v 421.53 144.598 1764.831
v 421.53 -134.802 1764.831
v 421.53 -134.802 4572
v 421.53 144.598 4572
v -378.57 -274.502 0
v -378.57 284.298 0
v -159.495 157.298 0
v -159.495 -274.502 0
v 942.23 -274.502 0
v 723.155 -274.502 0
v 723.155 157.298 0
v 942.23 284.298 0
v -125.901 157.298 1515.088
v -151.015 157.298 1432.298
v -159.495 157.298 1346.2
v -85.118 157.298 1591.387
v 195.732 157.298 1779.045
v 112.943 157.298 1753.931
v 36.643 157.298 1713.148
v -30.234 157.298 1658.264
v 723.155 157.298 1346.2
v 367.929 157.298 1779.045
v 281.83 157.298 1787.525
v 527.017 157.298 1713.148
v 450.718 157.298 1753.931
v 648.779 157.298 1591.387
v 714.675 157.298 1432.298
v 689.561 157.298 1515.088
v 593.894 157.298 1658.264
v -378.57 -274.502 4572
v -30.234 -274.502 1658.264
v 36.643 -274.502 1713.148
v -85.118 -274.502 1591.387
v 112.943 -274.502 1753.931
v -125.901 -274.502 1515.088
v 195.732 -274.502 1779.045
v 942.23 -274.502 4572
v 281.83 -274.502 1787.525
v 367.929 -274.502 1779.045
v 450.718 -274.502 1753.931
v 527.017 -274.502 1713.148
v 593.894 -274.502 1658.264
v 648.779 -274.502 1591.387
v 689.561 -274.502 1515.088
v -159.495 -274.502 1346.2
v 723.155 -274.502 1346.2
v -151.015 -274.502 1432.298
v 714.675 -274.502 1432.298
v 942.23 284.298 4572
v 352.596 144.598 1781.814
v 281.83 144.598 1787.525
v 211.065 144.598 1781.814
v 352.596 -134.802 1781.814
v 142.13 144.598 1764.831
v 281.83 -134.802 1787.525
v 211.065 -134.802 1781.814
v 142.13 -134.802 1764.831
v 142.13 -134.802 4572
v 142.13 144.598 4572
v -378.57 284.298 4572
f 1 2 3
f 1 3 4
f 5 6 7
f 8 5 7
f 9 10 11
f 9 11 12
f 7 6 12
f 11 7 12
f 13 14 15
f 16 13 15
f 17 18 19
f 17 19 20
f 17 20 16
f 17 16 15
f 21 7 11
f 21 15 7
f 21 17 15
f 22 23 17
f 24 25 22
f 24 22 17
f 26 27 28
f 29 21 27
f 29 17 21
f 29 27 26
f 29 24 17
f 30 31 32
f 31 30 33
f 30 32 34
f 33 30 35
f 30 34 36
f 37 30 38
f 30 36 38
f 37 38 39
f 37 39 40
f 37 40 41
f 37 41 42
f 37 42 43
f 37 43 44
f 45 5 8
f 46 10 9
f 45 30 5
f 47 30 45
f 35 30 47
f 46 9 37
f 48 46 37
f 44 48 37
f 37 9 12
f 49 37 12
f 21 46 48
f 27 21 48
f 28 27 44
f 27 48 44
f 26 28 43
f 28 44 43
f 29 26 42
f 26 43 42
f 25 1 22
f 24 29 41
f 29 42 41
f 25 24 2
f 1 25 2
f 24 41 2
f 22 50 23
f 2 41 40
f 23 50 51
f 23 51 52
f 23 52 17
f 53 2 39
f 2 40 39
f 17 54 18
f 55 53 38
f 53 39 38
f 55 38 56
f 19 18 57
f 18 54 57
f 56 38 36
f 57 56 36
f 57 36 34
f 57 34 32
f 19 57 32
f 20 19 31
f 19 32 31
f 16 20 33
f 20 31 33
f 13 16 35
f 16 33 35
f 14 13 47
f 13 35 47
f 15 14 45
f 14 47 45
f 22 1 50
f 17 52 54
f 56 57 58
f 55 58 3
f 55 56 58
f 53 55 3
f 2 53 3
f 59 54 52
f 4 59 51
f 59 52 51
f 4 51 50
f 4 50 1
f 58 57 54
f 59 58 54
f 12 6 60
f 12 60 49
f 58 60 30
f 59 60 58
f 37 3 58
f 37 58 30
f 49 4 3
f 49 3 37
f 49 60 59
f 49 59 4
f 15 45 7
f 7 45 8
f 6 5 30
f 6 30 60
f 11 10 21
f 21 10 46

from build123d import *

# Parameters (mm, degrees)
F0_W     = 1320.8
F0_H     = 558.8
F0_W_2   = 279.4
F0_H_2   = 279.4
F1_DEPTH = 4572
F3_DEPTH = 431.8


with BuildPart() as f1:
    # F0 (on Top) → F1 (new body)
    with BuildSketch(Plane.XY):
        with Locations((281.830298, 4.898325)):
            Rectangle(F0_W, F0_H)
        with Locations((281.830298, 4.898325)):
            Rectangle(F0_W_2, F0_H_2, mode=Mode.SUBTRACT)
    extrude(amount=F1_DEPTH)

    # F2 (on face) → F3 (cut)
    with BuildSketch(Plane.XZ.offset(274.501675)):
        with BuildLine():
            Line((-159.494702, 0), (723.155298, 0))
            Line((723.155298, 0), (723.155298, 1346.2))
            ThreePointArc((723.155298, 1346.2), (281.830298, 1787.525), (-159.494702, 1346.2))
            Line((-159.494702, 1346.2), (-159.494702, 0))
        make_face()
    extrude(amount=-F3_DEPTH, mode=Mode.SUBTRACT)


solid = f1.part
